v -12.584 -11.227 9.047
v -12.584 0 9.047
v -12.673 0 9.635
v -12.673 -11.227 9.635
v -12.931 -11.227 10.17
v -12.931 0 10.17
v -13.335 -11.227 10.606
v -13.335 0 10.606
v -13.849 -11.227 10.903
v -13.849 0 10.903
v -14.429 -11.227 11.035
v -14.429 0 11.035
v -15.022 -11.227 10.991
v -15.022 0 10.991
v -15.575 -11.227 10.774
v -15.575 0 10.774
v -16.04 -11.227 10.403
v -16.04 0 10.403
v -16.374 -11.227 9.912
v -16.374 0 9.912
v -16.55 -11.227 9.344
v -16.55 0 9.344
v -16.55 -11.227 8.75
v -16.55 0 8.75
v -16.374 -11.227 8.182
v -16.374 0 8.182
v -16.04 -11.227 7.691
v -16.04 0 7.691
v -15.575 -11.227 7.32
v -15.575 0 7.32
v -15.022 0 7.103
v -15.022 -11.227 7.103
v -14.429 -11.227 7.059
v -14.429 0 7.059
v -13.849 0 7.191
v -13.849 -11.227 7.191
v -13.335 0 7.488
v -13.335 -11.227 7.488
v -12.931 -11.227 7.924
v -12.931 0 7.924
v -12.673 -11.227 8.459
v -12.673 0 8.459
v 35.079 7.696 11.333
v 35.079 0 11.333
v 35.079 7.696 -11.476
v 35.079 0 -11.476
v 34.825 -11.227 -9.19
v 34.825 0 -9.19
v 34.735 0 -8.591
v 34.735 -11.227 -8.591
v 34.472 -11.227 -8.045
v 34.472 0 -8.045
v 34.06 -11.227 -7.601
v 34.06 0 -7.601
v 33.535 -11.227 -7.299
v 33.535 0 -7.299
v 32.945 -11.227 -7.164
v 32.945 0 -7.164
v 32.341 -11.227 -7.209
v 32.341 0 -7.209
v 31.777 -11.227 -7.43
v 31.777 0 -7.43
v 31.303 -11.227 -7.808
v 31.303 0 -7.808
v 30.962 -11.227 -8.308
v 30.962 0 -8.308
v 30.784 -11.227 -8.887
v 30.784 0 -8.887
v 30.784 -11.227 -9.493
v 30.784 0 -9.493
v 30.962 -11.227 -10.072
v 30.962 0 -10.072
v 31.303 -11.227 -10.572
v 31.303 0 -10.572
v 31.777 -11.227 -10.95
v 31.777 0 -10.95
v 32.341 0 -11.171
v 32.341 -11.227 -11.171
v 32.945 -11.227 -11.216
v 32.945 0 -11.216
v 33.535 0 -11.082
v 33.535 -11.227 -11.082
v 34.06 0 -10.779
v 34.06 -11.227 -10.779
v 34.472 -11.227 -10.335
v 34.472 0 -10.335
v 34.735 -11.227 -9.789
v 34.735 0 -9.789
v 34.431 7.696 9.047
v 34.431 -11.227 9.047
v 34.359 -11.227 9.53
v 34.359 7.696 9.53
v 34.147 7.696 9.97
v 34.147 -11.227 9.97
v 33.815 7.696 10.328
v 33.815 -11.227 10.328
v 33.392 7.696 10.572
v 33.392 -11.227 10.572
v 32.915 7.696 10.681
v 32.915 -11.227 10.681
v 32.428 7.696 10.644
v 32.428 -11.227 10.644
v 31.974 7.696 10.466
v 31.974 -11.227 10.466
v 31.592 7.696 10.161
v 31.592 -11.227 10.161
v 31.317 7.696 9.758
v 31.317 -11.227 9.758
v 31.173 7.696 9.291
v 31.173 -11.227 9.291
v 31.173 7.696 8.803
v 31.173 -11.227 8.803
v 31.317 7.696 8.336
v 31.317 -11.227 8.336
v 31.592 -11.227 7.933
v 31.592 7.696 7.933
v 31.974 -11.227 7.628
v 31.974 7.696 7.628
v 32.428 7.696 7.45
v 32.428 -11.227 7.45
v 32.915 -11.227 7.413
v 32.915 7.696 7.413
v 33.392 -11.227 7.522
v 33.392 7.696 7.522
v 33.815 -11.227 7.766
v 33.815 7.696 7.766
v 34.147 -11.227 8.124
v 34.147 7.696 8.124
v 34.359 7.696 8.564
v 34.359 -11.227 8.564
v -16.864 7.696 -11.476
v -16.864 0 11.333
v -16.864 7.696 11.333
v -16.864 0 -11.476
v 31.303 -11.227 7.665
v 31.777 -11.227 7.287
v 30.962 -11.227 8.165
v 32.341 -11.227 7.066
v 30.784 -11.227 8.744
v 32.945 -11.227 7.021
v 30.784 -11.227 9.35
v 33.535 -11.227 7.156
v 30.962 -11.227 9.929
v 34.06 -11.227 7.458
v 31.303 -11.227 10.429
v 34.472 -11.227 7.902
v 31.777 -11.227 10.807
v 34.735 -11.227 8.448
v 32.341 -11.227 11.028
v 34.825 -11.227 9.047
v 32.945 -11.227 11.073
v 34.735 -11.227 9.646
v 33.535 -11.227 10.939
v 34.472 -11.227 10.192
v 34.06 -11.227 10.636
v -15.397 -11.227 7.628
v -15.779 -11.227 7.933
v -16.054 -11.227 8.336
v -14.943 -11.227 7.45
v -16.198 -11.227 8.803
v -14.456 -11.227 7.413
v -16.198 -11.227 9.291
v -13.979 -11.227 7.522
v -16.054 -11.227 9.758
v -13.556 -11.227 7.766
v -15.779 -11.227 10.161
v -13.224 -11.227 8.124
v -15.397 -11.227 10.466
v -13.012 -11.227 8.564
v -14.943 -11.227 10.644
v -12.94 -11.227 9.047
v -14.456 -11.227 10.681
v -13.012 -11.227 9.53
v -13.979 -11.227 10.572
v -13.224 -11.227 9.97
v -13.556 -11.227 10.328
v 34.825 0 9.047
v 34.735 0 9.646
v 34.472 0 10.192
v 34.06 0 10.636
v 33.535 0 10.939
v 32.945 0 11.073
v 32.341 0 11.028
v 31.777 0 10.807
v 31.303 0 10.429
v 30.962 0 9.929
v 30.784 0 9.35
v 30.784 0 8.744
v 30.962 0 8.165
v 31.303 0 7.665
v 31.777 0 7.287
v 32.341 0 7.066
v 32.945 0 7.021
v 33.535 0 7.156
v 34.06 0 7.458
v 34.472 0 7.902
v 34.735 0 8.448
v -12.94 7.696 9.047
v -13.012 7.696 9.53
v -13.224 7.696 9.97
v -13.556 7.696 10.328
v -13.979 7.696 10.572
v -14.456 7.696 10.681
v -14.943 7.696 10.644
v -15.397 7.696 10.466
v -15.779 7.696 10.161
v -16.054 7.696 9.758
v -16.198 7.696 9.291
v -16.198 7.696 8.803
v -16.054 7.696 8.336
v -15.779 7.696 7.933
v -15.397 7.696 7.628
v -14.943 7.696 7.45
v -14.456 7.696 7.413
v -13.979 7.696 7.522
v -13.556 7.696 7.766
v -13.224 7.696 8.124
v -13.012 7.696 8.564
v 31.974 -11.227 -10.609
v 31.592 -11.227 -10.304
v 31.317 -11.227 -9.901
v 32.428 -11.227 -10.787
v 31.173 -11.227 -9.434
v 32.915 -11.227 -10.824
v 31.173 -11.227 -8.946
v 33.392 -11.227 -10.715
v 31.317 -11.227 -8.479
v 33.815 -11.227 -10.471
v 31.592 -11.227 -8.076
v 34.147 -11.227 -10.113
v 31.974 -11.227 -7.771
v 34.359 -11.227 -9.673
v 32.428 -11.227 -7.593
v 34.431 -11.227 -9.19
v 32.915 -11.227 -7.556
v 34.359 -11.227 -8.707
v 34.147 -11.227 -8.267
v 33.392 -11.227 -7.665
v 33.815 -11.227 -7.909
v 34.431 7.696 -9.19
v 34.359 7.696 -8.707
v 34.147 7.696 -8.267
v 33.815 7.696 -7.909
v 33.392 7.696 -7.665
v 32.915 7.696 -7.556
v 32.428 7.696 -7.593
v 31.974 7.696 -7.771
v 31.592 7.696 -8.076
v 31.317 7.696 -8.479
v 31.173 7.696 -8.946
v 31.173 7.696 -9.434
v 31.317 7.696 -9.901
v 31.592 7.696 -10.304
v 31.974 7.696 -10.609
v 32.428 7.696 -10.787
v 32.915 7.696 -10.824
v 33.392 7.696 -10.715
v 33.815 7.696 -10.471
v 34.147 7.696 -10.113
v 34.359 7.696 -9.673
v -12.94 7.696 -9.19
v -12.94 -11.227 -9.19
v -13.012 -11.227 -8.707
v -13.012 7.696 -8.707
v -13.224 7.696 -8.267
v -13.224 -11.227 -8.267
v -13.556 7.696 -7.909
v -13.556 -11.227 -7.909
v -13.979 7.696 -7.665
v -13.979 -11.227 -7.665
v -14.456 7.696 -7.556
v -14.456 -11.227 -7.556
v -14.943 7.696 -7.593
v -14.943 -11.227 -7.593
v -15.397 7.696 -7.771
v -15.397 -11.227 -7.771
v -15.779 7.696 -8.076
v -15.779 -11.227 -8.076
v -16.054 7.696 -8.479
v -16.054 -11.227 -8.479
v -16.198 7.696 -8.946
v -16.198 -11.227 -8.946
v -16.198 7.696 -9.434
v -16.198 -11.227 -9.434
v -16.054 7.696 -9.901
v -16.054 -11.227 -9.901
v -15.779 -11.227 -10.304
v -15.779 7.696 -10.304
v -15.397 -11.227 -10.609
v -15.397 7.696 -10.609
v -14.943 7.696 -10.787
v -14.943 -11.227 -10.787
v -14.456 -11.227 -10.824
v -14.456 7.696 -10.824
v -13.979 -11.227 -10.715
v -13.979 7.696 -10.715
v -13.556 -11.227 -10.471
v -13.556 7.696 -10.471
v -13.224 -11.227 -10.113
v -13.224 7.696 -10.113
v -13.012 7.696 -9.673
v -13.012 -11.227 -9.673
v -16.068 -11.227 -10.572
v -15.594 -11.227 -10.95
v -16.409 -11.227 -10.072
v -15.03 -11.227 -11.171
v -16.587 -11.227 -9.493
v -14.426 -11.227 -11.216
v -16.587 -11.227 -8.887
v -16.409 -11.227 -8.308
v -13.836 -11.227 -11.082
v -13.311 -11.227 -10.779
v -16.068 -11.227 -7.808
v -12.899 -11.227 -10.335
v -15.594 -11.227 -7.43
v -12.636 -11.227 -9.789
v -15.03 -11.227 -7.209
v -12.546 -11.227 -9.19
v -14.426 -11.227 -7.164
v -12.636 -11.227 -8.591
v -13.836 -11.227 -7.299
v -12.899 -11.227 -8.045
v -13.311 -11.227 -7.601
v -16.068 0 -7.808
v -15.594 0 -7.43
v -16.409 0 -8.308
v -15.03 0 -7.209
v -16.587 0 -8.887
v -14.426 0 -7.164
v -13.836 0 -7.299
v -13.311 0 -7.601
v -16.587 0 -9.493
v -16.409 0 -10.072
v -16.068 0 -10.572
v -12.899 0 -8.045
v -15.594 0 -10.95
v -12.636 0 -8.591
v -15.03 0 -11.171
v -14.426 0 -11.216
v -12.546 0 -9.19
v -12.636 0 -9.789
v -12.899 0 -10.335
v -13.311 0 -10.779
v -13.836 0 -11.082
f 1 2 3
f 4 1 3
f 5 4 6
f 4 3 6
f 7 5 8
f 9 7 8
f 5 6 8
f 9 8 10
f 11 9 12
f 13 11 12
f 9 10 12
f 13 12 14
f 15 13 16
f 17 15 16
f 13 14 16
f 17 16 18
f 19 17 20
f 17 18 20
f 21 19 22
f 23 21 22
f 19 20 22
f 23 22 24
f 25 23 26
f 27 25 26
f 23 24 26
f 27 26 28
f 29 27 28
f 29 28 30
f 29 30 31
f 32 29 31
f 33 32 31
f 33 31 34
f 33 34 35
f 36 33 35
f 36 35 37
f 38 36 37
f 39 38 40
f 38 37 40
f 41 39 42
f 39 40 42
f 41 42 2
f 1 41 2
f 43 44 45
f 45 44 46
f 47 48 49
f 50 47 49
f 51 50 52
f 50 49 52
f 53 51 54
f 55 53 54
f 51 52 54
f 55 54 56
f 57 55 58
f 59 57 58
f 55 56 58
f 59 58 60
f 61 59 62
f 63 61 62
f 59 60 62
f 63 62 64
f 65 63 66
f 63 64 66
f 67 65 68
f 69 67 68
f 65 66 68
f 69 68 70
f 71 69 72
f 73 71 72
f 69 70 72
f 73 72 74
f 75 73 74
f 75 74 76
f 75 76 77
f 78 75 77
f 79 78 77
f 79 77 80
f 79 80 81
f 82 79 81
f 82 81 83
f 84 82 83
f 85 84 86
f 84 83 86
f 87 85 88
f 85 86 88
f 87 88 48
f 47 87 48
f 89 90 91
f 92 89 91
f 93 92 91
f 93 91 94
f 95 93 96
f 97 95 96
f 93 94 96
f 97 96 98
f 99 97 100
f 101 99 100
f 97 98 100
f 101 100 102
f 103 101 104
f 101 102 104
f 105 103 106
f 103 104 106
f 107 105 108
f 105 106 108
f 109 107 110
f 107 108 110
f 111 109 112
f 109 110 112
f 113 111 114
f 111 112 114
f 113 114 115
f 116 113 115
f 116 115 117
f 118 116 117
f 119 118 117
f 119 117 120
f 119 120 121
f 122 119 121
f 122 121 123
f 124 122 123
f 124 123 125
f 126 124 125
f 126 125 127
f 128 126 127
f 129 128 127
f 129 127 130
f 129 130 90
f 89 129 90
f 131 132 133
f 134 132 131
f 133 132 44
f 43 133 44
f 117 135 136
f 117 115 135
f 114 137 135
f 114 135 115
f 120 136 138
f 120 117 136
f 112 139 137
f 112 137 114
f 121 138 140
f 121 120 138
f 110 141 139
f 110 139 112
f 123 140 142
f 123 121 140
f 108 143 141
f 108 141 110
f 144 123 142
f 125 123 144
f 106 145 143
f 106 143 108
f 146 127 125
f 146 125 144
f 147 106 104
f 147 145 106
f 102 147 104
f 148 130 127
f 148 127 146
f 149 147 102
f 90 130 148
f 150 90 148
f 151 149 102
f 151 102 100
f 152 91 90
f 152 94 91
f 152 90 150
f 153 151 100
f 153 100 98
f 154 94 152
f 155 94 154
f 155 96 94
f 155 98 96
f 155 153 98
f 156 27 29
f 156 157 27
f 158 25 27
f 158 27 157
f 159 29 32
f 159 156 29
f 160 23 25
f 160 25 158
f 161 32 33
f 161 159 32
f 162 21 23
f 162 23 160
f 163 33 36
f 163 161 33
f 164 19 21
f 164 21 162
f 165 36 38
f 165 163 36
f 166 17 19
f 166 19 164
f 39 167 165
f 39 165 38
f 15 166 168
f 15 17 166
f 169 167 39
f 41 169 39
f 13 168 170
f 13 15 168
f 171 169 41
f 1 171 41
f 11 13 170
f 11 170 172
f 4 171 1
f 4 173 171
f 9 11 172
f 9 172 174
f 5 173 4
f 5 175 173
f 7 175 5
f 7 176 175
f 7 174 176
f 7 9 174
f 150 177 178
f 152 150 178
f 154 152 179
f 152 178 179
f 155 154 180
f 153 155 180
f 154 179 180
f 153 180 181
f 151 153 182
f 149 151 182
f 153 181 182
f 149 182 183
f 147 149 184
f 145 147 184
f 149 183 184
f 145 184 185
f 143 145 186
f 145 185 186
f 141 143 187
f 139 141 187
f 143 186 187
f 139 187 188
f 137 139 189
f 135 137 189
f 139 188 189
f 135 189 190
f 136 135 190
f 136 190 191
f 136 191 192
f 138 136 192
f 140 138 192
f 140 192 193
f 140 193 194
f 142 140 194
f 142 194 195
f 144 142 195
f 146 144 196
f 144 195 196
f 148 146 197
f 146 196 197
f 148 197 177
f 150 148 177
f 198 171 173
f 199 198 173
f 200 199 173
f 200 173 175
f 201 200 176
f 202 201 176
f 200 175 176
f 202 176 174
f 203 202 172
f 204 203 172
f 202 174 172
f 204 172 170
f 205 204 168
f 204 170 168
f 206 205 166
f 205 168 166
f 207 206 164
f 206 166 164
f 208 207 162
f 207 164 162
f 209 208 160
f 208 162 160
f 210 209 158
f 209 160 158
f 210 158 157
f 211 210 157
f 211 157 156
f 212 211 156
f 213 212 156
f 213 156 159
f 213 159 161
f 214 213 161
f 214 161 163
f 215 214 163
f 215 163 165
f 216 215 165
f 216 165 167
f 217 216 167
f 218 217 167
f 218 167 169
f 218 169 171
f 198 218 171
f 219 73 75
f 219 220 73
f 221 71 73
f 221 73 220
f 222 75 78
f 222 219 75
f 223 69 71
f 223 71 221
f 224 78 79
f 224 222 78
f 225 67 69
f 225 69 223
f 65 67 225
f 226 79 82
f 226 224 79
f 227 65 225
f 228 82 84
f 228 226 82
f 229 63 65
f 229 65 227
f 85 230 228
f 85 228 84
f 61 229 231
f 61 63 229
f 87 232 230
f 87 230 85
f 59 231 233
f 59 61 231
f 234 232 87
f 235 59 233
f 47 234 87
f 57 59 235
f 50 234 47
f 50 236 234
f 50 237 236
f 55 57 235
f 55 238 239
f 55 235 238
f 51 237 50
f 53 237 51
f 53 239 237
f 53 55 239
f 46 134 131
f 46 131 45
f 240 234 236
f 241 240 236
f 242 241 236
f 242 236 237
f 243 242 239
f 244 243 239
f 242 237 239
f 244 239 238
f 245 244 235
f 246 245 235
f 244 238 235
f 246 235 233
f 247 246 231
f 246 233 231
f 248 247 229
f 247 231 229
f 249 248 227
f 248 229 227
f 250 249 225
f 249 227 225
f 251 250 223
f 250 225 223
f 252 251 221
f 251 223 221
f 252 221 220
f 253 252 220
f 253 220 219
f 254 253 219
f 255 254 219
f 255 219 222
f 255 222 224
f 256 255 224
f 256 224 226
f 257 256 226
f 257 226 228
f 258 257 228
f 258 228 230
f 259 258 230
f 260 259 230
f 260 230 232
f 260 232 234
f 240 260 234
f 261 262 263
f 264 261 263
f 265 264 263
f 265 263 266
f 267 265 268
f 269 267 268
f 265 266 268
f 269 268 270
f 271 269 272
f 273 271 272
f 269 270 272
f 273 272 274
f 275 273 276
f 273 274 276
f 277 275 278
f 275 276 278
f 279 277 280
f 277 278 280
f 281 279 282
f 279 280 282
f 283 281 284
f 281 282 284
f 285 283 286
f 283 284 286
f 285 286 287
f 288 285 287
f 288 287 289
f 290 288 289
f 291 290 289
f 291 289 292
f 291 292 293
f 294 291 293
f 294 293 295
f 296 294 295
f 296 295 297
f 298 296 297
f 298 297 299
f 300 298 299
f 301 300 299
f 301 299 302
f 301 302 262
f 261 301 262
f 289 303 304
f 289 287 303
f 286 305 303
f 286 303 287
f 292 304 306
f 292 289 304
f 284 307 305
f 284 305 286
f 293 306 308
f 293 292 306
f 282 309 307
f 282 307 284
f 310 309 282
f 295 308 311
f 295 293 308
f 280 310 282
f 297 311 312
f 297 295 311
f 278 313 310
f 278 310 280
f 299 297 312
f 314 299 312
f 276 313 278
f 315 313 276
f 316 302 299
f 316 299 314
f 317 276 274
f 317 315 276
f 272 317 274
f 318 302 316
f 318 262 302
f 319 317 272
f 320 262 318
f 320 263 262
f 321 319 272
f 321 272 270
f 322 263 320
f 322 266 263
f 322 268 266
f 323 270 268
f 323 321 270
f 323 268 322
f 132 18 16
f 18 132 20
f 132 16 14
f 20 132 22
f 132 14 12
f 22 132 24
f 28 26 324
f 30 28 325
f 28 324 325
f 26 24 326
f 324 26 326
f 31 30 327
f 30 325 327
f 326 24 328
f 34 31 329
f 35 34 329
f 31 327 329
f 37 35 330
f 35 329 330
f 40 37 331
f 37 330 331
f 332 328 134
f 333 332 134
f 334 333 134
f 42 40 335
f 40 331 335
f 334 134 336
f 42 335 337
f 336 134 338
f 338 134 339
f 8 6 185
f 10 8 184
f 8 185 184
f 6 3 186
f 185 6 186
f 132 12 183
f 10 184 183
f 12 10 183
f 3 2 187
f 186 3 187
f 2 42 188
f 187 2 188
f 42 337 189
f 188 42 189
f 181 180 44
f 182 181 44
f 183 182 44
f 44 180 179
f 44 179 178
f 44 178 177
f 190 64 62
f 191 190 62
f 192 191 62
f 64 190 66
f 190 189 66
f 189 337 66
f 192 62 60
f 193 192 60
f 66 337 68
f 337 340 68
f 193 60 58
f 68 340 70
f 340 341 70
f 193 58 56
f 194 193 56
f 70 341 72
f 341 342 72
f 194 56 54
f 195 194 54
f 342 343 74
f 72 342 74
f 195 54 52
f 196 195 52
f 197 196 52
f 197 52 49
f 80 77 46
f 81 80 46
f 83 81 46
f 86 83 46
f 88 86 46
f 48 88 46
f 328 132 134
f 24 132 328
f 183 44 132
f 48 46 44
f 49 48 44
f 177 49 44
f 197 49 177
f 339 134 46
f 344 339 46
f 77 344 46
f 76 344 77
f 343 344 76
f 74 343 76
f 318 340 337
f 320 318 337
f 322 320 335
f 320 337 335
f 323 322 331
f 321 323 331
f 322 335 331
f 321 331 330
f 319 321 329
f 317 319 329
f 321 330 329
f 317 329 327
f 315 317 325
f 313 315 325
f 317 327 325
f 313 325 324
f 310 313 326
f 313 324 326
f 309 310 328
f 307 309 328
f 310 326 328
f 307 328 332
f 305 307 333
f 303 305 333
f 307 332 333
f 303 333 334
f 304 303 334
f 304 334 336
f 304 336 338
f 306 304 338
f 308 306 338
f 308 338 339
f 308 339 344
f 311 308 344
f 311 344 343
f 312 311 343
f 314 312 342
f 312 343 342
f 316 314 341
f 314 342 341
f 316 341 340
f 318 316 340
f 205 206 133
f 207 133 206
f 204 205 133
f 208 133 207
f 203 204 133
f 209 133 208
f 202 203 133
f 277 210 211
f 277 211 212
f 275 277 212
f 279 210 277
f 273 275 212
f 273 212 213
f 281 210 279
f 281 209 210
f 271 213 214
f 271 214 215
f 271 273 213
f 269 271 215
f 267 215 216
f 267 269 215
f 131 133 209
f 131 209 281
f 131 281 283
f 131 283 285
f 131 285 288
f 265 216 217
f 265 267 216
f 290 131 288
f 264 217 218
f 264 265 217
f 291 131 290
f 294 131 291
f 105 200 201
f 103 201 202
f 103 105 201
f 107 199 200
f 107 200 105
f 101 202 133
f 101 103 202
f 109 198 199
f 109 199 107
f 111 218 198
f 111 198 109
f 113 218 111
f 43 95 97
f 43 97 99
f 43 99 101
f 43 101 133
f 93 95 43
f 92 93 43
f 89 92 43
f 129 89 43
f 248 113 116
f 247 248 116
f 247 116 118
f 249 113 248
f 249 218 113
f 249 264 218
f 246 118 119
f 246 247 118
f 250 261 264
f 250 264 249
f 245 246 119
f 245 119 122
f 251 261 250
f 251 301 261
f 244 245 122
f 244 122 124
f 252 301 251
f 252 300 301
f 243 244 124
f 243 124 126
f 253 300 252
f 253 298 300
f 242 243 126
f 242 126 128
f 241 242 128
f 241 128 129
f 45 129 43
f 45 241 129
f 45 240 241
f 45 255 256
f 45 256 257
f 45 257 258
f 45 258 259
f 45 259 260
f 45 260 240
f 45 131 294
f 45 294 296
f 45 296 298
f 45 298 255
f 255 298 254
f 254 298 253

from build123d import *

# Parameters (mm, degrees)
SKETCH1_W           = 51.943
SKETCH1_H           = 22.8092
BOSS_EXTRUDE1_DEPTH = 7.6962
SKETCH2_R           = 1.9939
SKETCH2_R_2         = 2.032
BOSS_EXTRUDE2_DEPTH = 11.2268
SKETCH3_R           = 1.6383
CUT_EXTRUDE1_DEPTH  = 19.923


with BuildPart() as part:
    # Sketch1 → Boss-Extrude1 (new body)
    with BuildSketch(Plane(origin=(0, 0, 0), x_dir=(1, 0, 0), z_dir=(0, 1, 0))):
        with Locations((9.107555138, 0.071457393)):
            Rectangle(SKETCH1_W, SKETCH1_H)
    extrude(amount=BOSS_EXTRUDE1_DEPTH)

    # Sketch2 → Boss-Extrude2 (add)
    with BuildSketch(Plane.XZ):
        with Locations((-14.577944862, 9.047142607)):
            Circle(SKETCH2_R)
        with Locations((32.793055138, 9.047142607)):
            Circle(SKETCH2_R_2)
        with Locations((32.793055138, -9.190057393)):
            Circle(SKETCH2_R_2)
        with Locations((-14.577944862, -9.190057393)):
            Circle(SKETCH2_R_2)
    extrude(amount=BOSS_EXTRUDE2_DEPTH)

    # Sketch3 → Cut-Extrude1 (cut, through all)
    with BuildSketch(Plane.XZ.offset(11.2268)):
        with Locations((-14.577944862, 9.047142607)):
            Circle(SKETCH3_R)
        with Locations((-14.577944862, -9.190057393)):
            Circle(SKETCH3_R)
        with Locations((32.793055138, -9.190057393)):
            Circle(SKETCH3_R)
        with Locations((32.793055138, 9.047142607)):
            Circle(SKETCH3_R)
    extrude(amount=-CUT_EXTRUDE1_DEPTH, mode=Mode.SUBTRACT)


solid = part.part
